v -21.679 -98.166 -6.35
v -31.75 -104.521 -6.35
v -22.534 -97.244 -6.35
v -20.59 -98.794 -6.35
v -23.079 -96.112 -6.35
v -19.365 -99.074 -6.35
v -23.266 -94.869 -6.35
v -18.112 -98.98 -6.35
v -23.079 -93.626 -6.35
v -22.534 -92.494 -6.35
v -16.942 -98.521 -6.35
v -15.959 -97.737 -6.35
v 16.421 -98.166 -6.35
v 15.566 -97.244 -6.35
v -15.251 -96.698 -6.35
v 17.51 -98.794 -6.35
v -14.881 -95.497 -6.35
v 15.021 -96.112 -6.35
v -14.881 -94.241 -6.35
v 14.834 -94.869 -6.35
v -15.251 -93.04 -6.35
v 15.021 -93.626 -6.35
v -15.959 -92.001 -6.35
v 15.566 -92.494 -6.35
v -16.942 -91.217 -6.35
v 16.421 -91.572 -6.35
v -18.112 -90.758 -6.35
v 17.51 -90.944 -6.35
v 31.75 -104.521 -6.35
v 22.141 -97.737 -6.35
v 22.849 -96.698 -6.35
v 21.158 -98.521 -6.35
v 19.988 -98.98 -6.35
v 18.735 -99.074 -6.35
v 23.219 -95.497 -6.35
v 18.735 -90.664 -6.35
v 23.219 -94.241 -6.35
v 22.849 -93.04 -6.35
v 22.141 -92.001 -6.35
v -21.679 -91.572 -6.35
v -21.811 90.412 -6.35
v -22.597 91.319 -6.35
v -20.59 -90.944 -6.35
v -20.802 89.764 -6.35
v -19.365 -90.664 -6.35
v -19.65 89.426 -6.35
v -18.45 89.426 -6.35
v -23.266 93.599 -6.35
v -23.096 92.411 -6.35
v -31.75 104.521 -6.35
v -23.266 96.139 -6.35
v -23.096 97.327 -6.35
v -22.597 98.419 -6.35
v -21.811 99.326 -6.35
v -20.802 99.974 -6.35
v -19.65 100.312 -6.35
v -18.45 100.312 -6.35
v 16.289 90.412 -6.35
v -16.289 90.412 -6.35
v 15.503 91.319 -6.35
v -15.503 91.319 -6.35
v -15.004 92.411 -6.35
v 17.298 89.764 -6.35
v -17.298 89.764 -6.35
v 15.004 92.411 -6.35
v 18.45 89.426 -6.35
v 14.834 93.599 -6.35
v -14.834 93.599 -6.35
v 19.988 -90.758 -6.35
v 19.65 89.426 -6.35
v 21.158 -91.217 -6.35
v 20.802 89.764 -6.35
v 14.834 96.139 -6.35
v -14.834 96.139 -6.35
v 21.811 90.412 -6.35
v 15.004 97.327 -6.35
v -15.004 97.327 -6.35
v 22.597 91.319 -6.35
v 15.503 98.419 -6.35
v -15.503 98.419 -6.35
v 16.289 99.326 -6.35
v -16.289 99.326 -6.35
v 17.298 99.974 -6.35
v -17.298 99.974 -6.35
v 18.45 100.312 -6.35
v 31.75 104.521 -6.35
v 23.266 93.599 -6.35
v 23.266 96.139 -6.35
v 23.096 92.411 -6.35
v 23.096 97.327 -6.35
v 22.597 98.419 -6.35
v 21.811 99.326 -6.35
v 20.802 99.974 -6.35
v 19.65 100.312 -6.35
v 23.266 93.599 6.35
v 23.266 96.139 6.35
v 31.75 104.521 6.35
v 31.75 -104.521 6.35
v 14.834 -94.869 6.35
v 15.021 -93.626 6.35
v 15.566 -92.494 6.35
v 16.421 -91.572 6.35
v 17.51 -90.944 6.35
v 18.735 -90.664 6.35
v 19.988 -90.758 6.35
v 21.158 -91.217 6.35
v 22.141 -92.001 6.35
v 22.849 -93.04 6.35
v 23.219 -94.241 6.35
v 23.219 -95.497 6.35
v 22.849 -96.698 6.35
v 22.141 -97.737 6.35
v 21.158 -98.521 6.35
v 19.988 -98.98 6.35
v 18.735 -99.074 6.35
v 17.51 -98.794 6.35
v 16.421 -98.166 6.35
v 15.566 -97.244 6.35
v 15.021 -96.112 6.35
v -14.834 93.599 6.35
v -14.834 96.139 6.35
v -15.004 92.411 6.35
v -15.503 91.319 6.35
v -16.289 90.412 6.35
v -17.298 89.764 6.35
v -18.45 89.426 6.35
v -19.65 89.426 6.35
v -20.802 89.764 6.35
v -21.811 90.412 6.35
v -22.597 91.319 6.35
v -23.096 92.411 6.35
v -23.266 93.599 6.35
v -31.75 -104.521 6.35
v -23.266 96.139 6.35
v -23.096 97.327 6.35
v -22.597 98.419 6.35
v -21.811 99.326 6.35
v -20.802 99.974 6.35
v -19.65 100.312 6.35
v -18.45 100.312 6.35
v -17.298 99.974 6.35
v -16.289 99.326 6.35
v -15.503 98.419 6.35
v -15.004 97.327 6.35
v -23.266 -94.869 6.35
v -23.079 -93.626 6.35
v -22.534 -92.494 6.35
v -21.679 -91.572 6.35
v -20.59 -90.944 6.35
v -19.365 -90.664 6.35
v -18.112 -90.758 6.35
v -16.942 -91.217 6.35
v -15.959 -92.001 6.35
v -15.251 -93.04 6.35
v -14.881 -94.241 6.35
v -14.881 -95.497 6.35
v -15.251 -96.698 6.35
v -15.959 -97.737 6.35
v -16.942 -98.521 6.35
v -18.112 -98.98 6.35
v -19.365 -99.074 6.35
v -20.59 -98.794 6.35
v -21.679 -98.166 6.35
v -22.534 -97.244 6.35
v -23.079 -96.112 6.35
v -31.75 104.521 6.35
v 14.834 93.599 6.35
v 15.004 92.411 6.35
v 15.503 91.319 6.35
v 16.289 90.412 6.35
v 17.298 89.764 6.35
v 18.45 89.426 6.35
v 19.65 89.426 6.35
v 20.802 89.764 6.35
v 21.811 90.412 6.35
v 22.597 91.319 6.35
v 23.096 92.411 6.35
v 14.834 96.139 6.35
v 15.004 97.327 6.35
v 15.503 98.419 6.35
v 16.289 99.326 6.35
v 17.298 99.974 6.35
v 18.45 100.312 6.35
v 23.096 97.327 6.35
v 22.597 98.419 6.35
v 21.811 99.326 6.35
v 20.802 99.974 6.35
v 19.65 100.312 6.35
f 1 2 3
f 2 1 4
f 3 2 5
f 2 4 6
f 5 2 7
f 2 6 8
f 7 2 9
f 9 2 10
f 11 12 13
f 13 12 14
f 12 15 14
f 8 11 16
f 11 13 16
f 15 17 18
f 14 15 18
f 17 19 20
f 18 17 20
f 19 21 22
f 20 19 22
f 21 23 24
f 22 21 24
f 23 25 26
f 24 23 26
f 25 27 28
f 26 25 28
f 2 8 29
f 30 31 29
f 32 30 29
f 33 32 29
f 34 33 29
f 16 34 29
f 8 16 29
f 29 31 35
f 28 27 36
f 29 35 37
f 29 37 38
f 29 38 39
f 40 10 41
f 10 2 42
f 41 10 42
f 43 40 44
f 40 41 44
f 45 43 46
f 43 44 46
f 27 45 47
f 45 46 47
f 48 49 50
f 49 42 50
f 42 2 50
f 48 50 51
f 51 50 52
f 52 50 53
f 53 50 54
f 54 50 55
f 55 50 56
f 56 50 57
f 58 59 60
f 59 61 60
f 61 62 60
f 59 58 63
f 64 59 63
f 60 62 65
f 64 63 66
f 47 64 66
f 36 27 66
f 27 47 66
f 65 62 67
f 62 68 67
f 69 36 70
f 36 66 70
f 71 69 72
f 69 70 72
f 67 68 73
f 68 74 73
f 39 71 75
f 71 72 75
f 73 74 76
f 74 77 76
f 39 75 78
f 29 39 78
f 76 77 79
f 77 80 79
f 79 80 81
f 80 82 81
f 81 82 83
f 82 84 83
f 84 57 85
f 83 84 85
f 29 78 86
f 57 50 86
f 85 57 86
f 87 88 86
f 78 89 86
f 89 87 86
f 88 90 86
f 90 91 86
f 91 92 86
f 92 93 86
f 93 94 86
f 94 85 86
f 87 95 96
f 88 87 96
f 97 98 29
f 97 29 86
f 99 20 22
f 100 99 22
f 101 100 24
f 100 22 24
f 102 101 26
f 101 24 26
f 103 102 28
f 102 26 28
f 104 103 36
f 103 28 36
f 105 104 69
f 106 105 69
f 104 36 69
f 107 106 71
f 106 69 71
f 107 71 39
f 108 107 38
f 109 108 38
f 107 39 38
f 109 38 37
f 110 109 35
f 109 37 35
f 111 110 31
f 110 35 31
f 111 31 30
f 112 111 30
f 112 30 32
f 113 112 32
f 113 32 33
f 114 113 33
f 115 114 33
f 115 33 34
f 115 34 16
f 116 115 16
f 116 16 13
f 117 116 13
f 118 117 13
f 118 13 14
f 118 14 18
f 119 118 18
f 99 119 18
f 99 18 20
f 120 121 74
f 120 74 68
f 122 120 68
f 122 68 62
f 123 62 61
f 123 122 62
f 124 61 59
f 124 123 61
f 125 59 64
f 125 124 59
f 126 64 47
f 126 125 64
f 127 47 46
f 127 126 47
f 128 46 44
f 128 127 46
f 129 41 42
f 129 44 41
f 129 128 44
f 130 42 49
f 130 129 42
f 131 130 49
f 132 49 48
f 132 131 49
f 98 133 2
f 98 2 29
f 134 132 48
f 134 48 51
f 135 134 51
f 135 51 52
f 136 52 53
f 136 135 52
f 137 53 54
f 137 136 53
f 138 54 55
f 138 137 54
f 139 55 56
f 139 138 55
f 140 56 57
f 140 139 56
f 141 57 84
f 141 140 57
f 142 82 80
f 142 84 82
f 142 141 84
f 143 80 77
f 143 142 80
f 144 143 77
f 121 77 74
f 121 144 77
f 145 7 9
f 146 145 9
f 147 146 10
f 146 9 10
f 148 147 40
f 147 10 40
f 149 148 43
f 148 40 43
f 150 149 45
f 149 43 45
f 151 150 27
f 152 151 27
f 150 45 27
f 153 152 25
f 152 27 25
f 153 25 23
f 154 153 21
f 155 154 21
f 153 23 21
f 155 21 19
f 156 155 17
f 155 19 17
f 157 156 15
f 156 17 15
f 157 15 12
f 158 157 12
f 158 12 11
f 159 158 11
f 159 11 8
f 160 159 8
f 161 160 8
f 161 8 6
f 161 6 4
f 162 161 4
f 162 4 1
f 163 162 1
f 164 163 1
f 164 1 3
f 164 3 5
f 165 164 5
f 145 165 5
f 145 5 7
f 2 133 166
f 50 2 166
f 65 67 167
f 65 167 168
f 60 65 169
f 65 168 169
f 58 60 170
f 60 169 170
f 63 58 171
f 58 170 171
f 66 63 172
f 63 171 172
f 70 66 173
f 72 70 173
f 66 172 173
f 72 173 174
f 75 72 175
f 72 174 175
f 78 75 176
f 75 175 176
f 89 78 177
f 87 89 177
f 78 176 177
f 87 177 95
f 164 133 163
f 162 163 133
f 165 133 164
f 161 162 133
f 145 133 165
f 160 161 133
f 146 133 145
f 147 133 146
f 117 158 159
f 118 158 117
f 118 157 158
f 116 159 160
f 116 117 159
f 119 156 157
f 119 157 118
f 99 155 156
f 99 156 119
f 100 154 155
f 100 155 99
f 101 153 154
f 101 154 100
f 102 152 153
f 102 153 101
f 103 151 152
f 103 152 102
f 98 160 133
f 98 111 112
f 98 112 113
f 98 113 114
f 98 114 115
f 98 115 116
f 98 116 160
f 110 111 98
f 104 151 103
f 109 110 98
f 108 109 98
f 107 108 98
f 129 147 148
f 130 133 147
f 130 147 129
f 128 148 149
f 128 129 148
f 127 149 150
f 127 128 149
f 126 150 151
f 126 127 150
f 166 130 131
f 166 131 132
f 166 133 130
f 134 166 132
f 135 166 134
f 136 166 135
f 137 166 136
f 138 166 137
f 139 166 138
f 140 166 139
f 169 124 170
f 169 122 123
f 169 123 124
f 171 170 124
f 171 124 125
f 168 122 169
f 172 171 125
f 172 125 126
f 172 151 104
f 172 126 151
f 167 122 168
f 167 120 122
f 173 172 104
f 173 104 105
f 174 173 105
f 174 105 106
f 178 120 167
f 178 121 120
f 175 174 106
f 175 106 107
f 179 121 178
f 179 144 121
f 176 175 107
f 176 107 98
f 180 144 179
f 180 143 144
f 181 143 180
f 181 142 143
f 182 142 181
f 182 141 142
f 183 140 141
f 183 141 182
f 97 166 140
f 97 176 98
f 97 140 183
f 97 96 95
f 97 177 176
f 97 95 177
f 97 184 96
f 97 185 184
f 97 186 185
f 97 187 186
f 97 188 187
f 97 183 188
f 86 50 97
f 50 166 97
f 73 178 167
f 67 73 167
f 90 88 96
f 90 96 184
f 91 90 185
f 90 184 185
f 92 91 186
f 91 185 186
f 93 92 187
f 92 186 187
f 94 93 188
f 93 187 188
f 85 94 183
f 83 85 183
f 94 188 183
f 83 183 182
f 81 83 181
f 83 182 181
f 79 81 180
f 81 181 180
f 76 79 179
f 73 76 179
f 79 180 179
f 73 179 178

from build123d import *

# Parameters (mm, degrees)
SKETCH1_W_MOCK_PCB_W     = 63.5
SKETCH1_W_MOCK_PCB_H     = 209.042
BOSS_EXTRUDE1_DEPTH      = 6.35
F_5_16_CLEARANCE_HOLE1_D = 8.4328
CUT_EXTRUDE1_DEPTH       = 13.7


with BuildPart() as part:
    # Sketch1 w/mock PCB → Boss-Extrude1 (new body, symmetric)
    with BuildSketch(Plane.XY):
        Rectangle(SKETCH1_W_MOCK_PCB_W, SKETCH1_W_MOCK_PCB_H)
    extrude(amount=BOSS_EXTRUDE1_DEPTH, both=True)

    # 5/16 Clearance Hole1 (through all)
    with Locations(Plane.XY.offset(6.35)):
        with Locations((-19.05, -94.869), (19.05, -94.869)):
            Hole(F_5_16_CLEARANCE_HOLE1_D / 2)

    # Sketch3 → Cut-Extrude1 (cut, through all)
    with BuildSketch(Plane.XY.offset(6.35)):
        with BuildLine():
            Line((-23.2664, 93.599), (-23.2664, 96.139))
            ThreePointArc((-23.2664, 96.139), (-19.05, 100.3554), (-14.8336, 96.139))
            Line((-14.8336, 96.139), (-14.8336, 93.599))
            ThreePointArc((-14.8336, 93.599), (-19.05, 89.3826), (-23.2664, 93.599))
        make_face()
        with BuildLine():
            Line((23.2664, 93.599), (23.2664, 96.139))
            ThreePointArc((23.2664, 96.139), (19.05, 100.3554), (14.8336, 96.139))
            Line((14.8336, 96.139), (14.8336, 93.599))
            ThreePointArc((14.8336, 93.599), (19.05, 89.3826), (23.2664, 93.599))
        make_face()
    extrude(amount=-CUT_EXTRUDE1_DEPTH, mode=Mode.SUBTRACT)


solid = part.part
